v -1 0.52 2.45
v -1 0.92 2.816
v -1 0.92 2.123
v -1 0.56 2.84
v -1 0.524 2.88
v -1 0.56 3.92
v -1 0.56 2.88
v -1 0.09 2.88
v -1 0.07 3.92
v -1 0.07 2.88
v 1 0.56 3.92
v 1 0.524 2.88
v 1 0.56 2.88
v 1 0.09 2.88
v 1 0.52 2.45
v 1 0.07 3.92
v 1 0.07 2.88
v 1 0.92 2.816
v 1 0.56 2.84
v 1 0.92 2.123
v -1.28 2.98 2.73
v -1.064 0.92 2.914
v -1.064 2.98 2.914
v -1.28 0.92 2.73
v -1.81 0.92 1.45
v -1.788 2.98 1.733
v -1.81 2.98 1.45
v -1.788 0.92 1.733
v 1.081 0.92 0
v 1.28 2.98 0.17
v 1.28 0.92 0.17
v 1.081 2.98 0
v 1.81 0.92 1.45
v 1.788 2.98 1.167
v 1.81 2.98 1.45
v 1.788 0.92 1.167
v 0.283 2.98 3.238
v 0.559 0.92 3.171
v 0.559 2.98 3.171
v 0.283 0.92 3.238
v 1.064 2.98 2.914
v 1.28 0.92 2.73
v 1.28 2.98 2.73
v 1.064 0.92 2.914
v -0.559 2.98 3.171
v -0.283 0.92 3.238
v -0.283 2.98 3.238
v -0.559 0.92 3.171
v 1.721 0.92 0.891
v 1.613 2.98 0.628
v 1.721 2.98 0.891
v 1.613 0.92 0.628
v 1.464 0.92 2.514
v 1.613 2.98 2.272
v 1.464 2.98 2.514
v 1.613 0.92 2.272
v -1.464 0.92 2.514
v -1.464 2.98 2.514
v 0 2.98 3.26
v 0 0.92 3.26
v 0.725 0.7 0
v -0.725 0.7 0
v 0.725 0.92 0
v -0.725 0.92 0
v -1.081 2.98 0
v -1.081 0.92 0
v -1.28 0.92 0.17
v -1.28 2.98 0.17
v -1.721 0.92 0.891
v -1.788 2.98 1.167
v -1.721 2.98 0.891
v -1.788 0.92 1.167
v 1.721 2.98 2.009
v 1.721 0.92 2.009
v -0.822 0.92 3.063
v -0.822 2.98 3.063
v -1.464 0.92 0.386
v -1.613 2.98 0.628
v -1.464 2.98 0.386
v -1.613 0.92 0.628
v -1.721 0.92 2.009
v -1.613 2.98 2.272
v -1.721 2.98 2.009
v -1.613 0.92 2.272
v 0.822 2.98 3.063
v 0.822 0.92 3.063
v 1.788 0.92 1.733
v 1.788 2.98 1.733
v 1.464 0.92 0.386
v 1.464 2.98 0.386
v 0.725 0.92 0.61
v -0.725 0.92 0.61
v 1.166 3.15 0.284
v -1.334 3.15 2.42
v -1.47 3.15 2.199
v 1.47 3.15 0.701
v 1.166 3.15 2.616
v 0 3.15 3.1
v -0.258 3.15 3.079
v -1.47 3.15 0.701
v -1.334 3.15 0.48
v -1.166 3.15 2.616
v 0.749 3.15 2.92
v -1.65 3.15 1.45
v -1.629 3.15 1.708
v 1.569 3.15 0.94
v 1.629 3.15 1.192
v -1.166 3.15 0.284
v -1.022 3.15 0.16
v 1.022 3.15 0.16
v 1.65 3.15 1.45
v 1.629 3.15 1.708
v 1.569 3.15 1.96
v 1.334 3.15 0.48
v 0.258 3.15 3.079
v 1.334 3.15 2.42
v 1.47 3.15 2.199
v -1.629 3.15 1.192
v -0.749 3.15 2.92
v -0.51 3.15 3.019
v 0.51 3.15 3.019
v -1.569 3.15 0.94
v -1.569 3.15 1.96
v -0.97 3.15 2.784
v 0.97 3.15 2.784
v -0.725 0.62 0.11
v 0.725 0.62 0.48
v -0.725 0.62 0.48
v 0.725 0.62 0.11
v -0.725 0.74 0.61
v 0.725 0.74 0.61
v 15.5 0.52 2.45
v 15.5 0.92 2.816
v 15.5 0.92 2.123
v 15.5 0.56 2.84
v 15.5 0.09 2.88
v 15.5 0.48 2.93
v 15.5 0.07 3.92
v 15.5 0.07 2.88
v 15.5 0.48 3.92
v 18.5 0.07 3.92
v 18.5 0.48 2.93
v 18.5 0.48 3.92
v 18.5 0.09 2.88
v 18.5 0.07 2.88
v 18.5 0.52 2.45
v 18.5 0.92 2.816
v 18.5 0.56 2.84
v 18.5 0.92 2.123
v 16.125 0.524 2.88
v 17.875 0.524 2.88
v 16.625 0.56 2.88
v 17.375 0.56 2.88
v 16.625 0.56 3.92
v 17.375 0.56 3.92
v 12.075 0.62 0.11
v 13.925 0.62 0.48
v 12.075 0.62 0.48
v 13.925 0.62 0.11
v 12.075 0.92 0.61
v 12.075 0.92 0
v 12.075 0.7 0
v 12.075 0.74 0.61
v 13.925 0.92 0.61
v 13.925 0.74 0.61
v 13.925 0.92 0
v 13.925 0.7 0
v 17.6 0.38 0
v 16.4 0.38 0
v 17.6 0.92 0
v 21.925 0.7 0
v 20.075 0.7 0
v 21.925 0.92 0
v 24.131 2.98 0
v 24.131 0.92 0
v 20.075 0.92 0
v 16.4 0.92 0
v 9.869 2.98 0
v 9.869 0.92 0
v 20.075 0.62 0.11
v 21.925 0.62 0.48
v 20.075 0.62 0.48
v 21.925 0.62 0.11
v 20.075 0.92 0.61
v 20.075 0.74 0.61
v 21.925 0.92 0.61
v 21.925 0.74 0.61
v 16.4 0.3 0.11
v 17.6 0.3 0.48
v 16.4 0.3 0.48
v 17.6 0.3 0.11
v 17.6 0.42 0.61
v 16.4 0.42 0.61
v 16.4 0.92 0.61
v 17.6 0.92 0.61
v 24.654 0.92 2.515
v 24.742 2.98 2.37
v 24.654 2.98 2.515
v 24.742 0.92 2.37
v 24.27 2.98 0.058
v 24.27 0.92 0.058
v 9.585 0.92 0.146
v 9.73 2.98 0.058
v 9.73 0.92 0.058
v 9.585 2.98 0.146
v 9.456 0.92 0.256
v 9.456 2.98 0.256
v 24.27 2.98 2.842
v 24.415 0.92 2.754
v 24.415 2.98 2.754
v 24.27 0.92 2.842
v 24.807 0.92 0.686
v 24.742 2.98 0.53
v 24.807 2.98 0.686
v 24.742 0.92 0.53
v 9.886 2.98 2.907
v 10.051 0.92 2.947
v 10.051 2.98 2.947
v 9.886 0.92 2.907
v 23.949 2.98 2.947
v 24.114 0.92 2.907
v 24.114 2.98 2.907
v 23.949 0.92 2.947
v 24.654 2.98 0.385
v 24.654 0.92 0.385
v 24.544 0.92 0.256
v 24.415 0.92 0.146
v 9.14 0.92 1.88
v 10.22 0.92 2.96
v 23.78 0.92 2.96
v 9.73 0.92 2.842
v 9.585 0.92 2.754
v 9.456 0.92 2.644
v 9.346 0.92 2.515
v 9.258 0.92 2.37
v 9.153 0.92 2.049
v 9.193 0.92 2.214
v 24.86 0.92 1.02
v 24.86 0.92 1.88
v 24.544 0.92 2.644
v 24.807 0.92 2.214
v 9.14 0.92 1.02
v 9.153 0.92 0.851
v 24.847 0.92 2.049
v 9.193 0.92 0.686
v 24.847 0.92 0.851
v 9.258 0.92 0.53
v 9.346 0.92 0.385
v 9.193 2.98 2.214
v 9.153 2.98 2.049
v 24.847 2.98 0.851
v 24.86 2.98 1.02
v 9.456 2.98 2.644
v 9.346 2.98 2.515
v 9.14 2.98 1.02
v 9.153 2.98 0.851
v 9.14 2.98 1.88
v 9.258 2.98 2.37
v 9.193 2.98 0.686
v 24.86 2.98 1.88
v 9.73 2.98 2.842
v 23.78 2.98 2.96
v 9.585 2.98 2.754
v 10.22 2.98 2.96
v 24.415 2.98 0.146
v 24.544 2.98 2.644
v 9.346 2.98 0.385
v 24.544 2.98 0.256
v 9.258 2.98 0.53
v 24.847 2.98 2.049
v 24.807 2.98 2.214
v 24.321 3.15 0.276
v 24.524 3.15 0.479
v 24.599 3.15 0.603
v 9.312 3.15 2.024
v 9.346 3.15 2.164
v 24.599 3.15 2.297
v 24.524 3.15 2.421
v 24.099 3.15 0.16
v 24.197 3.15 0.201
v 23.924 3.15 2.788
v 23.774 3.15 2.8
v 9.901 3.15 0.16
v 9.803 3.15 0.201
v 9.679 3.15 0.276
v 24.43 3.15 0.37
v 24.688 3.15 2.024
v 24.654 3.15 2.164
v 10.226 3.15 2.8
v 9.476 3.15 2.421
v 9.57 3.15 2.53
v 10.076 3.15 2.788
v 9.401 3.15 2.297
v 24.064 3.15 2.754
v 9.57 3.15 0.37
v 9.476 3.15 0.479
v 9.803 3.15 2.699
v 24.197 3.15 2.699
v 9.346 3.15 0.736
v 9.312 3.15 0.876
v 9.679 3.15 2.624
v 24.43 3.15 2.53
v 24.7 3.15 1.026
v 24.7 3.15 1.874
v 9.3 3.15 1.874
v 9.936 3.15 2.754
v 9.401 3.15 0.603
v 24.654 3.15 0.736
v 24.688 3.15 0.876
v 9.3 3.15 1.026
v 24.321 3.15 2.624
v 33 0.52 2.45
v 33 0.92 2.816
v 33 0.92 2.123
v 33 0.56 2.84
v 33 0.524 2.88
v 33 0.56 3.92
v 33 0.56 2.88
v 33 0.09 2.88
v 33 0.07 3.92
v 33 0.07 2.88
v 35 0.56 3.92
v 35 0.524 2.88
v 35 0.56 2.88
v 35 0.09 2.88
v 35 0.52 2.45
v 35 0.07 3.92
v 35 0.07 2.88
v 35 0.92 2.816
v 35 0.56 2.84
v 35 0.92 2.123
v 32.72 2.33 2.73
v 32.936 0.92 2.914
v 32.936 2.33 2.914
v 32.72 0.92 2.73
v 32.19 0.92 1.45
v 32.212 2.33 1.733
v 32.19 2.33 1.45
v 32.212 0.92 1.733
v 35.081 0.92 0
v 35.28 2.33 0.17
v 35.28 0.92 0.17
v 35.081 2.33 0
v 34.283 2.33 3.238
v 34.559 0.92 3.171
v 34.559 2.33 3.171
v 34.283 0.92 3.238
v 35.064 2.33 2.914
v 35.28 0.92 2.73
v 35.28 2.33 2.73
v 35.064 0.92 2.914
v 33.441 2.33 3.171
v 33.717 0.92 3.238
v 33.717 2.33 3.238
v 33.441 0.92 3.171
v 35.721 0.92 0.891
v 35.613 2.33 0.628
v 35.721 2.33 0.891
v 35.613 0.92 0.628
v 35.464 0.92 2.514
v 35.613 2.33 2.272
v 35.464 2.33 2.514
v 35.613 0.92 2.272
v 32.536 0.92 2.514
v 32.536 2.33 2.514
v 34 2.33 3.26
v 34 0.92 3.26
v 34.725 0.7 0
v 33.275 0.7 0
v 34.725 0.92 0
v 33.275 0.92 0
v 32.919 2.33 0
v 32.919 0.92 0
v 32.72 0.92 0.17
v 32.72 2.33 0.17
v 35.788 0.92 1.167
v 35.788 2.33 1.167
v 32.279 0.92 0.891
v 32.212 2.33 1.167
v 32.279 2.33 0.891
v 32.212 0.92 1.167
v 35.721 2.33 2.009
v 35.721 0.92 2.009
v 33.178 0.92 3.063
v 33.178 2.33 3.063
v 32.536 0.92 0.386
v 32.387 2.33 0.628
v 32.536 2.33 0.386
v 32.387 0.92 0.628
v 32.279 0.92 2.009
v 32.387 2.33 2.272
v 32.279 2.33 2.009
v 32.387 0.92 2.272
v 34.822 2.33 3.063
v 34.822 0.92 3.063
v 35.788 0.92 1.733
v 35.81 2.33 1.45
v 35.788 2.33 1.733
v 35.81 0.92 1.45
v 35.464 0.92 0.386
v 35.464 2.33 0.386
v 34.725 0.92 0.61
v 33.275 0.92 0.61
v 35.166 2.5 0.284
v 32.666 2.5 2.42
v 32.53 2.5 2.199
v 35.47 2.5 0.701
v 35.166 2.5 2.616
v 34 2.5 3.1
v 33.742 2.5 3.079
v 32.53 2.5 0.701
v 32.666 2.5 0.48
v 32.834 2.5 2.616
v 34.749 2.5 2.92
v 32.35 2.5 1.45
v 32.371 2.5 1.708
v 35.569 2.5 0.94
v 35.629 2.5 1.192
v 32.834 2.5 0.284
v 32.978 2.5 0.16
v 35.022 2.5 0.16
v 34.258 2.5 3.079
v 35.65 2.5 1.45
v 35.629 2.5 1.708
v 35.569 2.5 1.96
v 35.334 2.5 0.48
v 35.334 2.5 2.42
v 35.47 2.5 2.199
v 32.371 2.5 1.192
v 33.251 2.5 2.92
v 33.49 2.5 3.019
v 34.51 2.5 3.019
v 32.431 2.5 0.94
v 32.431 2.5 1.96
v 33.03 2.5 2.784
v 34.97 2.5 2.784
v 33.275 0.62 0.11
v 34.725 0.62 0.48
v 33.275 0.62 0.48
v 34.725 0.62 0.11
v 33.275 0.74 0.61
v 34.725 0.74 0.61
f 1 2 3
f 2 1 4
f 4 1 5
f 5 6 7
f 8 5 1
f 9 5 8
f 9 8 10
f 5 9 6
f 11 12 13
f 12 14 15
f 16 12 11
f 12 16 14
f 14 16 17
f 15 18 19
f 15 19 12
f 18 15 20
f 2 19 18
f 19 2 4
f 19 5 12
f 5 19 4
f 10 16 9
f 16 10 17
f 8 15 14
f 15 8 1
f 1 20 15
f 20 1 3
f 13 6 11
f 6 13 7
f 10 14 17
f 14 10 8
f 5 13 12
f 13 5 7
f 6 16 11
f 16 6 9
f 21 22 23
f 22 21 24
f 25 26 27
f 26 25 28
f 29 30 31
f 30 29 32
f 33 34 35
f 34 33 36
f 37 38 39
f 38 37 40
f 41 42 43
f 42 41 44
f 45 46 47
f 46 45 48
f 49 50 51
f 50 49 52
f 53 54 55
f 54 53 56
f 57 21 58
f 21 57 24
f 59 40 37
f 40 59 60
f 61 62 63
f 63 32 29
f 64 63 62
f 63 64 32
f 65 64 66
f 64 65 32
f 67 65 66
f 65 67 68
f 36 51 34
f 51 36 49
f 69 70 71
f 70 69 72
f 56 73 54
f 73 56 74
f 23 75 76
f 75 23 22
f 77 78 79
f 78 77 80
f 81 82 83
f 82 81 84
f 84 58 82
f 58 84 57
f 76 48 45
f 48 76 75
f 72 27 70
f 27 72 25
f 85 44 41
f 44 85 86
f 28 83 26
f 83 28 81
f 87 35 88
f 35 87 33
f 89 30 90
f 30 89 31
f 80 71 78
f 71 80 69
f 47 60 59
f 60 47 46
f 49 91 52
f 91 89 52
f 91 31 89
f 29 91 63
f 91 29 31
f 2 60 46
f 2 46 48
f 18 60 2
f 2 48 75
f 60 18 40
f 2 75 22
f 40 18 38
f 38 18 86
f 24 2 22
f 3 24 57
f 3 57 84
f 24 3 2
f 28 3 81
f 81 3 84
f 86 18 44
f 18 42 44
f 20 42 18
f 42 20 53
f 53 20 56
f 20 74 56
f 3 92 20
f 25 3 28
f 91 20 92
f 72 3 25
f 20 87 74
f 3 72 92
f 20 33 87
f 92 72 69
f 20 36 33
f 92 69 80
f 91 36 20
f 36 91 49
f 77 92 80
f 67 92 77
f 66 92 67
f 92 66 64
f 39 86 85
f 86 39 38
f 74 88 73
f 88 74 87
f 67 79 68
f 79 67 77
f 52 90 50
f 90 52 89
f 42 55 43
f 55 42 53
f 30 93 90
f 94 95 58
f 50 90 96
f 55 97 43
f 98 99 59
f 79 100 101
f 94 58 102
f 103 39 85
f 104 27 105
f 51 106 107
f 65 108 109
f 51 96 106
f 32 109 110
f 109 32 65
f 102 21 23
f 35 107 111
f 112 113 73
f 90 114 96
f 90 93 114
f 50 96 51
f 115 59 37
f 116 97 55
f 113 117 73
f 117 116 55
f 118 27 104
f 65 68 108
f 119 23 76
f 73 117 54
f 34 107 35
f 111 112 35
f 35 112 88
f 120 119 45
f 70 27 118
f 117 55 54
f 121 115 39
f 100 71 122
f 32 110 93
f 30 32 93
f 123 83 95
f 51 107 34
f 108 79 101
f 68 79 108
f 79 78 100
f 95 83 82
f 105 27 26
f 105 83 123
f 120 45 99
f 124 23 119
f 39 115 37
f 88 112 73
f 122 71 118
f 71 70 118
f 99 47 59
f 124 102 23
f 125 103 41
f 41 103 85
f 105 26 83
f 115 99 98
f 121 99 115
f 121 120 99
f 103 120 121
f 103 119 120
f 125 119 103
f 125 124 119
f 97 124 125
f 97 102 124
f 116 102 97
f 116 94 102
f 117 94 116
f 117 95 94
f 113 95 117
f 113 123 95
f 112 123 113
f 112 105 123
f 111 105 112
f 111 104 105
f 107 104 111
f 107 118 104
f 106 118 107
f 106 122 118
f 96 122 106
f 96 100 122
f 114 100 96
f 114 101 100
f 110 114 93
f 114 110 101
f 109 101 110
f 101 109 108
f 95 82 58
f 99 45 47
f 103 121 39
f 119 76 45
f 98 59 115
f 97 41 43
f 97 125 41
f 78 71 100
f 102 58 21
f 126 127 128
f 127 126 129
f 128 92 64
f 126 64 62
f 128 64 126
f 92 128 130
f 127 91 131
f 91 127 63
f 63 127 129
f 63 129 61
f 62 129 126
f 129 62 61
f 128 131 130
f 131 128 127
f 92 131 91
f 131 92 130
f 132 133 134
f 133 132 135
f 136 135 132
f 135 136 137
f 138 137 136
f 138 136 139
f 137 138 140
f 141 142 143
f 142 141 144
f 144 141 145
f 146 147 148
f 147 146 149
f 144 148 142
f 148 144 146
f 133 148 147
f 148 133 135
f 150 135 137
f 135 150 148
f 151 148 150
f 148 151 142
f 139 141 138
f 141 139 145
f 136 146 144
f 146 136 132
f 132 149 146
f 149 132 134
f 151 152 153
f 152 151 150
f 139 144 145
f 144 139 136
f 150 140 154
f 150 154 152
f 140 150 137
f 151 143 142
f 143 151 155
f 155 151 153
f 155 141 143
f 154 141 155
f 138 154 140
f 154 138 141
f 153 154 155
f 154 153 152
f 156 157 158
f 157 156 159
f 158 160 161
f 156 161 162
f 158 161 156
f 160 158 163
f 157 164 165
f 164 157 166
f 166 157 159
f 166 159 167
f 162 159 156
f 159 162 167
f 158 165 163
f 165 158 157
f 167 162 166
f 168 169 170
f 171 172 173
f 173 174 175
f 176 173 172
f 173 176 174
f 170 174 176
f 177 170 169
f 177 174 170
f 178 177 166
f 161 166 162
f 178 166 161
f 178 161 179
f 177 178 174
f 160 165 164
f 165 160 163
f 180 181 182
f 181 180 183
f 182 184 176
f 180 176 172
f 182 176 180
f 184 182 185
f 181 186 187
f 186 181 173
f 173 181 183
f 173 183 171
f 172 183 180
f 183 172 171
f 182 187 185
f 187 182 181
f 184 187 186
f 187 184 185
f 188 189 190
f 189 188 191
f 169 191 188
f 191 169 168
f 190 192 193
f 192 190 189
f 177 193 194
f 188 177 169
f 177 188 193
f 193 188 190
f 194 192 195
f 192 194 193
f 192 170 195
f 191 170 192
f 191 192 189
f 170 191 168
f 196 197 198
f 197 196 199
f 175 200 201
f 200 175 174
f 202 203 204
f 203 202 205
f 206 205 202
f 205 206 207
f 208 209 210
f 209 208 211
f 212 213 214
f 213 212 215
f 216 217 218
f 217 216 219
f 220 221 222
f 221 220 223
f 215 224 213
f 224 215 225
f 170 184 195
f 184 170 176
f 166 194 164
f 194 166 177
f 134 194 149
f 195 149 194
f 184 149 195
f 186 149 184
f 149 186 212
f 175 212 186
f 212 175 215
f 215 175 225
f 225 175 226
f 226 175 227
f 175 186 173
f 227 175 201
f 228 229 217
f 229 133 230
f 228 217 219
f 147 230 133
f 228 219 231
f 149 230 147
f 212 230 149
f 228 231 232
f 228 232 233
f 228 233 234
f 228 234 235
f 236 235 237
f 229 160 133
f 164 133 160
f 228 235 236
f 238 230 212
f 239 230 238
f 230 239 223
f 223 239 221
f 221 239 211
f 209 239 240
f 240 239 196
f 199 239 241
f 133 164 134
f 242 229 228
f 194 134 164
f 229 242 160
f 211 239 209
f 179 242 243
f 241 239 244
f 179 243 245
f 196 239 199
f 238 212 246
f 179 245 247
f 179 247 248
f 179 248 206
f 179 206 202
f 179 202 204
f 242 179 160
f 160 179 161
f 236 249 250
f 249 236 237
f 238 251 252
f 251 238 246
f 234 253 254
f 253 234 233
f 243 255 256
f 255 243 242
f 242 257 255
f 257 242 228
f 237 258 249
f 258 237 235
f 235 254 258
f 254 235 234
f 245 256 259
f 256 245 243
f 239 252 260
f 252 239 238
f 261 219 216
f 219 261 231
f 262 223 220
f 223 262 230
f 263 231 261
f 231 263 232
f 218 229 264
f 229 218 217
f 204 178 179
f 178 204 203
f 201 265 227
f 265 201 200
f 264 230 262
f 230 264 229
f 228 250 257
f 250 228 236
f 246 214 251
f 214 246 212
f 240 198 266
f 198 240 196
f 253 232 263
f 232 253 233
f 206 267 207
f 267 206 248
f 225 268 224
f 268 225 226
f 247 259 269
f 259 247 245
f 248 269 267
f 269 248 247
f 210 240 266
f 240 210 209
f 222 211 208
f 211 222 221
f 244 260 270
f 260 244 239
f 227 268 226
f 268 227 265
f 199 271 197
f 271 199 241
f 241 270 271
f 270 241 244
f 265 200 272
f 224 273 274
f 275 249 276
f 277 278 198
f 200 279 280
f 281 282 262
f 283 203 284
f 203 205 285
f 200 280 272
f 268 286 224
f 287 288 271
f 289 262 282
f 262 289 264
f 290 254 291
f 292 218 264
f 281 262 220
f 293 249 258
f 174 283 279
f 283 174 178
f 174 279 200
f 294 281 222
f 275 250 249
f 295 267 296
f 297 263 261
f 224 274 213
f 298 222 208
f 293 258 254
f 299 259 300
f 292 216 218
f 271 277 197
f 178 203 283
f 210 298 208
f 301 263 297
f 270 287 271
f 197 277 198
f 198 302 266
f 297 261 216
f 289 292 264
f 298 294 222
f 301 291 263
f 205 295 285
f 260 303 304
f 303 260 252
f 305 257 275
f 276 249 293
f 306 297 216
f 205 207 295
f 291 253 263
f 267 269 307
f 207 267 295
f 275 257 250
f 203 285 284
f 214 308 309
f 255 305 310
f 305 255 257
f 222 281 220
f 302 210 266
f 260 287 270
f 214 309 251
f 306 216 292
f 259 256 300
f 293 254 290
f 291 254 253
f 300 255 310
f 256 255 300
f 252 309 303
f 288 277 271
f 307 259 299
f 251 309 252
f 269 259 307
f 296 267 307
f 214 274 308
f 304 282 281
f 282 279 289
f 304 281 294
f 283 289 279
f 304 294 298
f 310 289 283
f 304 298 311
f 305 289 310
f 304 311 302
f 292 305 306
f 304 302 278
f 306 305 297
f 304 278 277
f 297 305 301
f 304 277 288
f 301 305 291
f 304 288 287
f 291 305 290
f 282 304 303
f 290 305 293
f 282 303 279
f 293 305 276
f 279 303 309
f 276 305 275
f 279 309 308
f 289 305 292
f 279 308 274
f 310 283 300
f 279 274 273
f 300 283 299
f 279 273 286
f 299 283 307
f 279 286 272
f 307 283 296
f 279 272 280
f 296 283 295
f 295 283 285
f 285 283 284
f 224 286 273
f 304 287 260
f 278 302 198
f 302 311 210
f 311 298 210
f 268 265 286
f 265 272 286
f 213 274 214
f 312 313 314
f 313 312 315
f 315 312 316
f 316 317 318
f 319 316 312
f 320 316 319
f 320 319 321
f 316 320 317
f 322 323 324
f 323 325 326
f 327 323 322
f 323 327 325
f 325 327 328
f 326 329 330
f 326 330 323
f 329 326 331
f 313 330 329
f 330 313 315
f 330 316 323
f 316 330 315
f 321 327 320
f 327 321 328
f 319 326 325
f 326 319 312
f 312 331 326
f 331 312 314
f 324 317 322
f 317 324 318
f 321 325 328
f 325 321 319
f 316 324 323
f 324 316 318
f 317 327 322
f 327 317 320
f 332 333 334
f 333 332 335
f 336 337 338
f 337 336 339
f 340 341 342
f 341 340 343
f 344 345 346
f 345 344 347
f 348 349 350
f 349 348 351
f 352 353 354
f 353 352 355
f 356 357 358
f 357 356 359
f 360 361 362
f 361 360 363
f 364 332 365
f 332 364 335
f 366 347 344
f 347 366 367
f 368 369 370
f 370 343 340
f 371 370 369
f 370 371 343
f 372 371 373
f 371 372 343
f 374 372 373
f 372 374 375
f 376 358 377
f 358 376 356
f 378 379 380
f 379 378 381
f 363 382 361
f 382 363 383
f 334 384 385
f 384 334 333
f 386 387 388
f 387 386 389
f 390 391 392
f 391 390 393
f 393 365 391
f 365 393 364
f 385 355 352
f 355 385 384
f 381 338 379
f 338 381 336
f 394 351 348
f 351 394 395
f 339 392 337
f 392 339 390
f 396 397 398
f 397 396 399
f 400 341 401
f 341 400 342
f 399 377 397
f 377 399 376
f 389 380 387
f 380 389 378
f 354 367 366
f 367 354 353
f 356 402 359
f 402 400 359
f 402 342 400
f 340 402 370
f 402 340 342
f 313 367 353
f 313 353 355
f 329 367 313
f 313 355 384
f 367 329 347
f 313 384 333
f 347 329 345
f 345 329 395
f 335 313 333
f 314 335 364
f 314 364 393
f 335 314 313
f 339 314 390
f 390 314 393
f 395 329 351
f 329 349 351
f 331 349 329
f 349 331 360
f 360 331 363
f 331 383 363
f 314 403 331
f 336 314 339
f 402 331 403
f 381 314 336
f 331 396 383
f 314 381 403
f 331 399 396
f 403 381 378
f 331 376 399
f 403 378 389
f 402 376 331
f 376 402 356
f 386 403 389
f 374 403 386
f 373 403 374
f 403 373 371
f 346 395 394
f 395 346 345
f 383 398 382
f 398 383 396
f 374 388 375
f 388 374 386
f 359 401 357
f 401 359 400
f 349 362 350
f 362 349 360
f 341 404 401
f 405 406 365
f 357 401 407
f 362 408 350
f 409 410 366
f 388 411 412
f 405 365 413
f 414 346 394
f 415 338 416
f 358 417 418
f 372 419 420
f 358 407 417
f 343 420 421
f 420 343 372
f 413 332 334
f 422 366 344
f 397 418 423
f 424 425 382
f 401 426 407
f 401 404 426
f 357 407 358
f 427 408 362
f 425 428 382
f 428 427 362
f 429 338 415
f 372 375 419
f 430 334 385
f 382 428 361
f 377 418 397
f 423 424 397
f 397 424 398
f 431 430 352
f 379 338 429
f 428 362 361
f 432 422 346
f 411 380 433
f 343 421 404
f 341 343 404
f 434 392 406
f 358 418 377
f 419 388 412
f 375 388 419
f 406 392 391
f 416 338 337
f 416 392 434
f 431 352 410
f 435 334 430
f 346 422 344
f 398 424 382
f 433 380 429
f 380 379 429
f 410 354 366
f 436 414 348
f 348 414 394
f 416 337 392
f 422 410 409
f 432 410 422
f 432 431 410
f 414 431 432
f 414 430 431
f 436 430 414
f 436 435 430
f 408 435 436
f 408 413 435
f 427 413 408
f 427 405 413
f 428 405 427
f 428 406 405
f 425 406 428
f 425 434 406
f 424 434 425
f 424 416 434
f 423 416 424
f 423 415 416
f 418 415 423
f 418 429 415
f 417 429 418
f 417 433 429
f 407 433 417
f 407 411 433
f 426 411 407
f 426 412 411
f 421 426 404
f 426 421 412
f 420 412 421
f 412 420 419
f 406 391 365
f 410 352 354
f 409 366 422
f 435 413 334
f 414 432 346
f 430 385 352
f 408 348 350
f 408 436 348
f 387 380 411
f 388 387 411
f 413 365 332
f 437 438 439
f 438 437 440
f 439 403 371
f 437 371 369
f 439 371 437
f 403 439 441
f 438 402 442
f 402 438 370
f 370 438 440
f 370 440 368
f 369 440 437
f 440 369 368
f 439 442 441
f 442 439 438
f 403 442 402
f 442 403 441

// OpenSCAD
// Replacement keycaps for the two round holes and the long rocker slot in the original case.
// The case is only imported for fit checks. This file does not generate a new frame or lid.
use <eink-case.scad>

part = "keys";  // keys / keytest / preview / clearance / insertion
$fn = 40;

OUT = 64.5;
KEY_Z = 2.15;
BOARD_EDGE = 62.10;
TIP = 62.82;           // Bare switch stem ends at y=62.70
FLOOR = -1.45;
ROUND_D = 3.62;
ROCKER_W = 15.72;
ROCKER_H = 3.02;
ROCKER_X = 39.91;
SW_PITCH = 8;
CENTER_GAP = 0.10;
CENTER_PAD_W = 1.20;
END_GAP = 0.42;
KEY_X = [23.87, ROCKER_X, 55.48];
KINDS = ["menu", "rocker", "power"];

module rounded_rect(w, h, r) {
  offset(r=r) square([w-2*r,h-2*r], center=true);
}

module flat_profile(kind) {
  intersection() {
    if (kind == "rocker") rounded_rect(ROCKER_W,ROCKER_H,1.08);
    else circle(d=ROUND_D);
    translate([-9,FLOOR]) square([18,5]);
  }
}

module along_y(y0,y1) {
  translate([0,y1,0]) rotate([90,0,0]) linear_extrude(y1-y0) children();
}

// Polygon coordinates are outward depth and height. Extrude from left to right.
module across_x(cx, width, yz) {
  multmatrix([[0,0,1,cx-width/2],[1,0,0,0],[0,1,0,0],[0,0,0,1]])
    linear_extrude(width) polygon(yz);
}

module keeper_lip(width, lip) {
  across_x(0,width,[[61.97,1.43],[lip,1.43],[lip,2.47],[61.97,2.47]]);
}

module keeper(kind) {
  // One tapered inner lip retains the whole cap. For the rocker the lip is centred,
  // with its corners relieved to clear the frame at full tilt.
  width = kind == "rocker" ? 3.00 : 2.00;
  across_x(0,width,[[TIP+0.09,0.60],[62.42,1.00],[61.97,1.45],
                   [61.97,1.48],[62.38,1.48],[62.46,1.39],[TIP+0.09,1.36]]);
  if (kind == "rocker")
    hull() {
      keeper_lip(0.75,62.46);
      keeper_lip(3.00,62.38);
    }
  else keeper_lip(2.00,62.46);
}

module travel_pad(cx, width, gap) {
  // A broad rounded-off foot stops against the existing PCB edge below the switch.
  // Its underside shares the printing plane of the cap.
  back = BOARD_EDGE + gap;
  across_x(cx,width,[[back+0.08,FLOOR],[TIP+0.24,FLOOR],[TIP+0.24,-0.84],
                    [back+0.12,-0.84],[back,-0.97],[back,FLOOR+0.11]]);
}

module cap(kind) {
  // One uninterrupted plane across the entire pressing face, including the rocker.
  face = kind == "power" ? OUT-0.10 : OUT+0.55;
  union() {
    along_y(TIP,face-0.22) flat_profile(kind);
    hull() {
      along_y(face-0.23,face-0.17) flat_profile(kind);
      along_y(face-0.03,face) offset(delta=-0.16) flat_profile(kind);
    }
    keeper(kind);
    if (kind == "rocker") {
      for (end = [-1,1]) travel_pad(end*SW_PITCH/2,1.85,END_GAP);
      travel_pad(0,CENTER_PAD_W,CENTER_GAP);
    } else {
      travel_pad(0,1.45,END_GAP);
    }
  }
}

module fitted(i, inward=0, angle=0) {
  translate([KEY_X[i],0,KEY_Z]) mirror([0,1,0])
    translate([0,BOARD_EDGE,0]) rotate([0,0,angle])
      translate([0,-BOARD_EDGE-inward,0]) cap(KINDS[i]);
}

module print_keys() {
  for (i=[0:2]) translate([i*17,-61.9,-FLOOR]) cap(KINDS[i]);
}

module old_key_wall() {
  intersection() {
    frame();
    translate([18,-65,-1.9]) cube([44,7,7.4]);
  }
}

function rocker_shift(angle) = CENTER_GAP - CENTER_PAD_W/2*tan(abs(angle));

// Reports a solid if a cap hits the original frame during the nominal movements.
module clearance_check() {
  intersection() {
    old_key_wall();
    union() {
      for (i=[0:2], t=[0,0.04]) fitted(i,t);
      for (i=[0,2], t=[0.20,0.40]) fitted(i,t);
      for (a=[-4.15,-1.7,0,1.7,4.15]) fitted(1,rocker_shift(a)-0.01,a);
    }
  }
}

module insertion_check() {
  intersection() {
    old_key_wall();
    for (i=[0:2], t=[0.10,0.50,1.10,1.80,2.60]) fitted(i,t);
  }
}

if (part == "clearance") clearance_check();
else if (part == "insertion") insertion_check();
else if (part == "preview") {
  color([0.84,0.87,0.89]) old_key_wall();
  for (i=[0:2]) color(i==2 ? [0.66,0.30,0.25] : [0.26,0.50,0.58]) fitted(i);
} else if (part == "keytest") {
  translate([-18,65,1.526]) old_key_wall();
  translate([5,-10,0]) print_keys();
} else print_keys();
